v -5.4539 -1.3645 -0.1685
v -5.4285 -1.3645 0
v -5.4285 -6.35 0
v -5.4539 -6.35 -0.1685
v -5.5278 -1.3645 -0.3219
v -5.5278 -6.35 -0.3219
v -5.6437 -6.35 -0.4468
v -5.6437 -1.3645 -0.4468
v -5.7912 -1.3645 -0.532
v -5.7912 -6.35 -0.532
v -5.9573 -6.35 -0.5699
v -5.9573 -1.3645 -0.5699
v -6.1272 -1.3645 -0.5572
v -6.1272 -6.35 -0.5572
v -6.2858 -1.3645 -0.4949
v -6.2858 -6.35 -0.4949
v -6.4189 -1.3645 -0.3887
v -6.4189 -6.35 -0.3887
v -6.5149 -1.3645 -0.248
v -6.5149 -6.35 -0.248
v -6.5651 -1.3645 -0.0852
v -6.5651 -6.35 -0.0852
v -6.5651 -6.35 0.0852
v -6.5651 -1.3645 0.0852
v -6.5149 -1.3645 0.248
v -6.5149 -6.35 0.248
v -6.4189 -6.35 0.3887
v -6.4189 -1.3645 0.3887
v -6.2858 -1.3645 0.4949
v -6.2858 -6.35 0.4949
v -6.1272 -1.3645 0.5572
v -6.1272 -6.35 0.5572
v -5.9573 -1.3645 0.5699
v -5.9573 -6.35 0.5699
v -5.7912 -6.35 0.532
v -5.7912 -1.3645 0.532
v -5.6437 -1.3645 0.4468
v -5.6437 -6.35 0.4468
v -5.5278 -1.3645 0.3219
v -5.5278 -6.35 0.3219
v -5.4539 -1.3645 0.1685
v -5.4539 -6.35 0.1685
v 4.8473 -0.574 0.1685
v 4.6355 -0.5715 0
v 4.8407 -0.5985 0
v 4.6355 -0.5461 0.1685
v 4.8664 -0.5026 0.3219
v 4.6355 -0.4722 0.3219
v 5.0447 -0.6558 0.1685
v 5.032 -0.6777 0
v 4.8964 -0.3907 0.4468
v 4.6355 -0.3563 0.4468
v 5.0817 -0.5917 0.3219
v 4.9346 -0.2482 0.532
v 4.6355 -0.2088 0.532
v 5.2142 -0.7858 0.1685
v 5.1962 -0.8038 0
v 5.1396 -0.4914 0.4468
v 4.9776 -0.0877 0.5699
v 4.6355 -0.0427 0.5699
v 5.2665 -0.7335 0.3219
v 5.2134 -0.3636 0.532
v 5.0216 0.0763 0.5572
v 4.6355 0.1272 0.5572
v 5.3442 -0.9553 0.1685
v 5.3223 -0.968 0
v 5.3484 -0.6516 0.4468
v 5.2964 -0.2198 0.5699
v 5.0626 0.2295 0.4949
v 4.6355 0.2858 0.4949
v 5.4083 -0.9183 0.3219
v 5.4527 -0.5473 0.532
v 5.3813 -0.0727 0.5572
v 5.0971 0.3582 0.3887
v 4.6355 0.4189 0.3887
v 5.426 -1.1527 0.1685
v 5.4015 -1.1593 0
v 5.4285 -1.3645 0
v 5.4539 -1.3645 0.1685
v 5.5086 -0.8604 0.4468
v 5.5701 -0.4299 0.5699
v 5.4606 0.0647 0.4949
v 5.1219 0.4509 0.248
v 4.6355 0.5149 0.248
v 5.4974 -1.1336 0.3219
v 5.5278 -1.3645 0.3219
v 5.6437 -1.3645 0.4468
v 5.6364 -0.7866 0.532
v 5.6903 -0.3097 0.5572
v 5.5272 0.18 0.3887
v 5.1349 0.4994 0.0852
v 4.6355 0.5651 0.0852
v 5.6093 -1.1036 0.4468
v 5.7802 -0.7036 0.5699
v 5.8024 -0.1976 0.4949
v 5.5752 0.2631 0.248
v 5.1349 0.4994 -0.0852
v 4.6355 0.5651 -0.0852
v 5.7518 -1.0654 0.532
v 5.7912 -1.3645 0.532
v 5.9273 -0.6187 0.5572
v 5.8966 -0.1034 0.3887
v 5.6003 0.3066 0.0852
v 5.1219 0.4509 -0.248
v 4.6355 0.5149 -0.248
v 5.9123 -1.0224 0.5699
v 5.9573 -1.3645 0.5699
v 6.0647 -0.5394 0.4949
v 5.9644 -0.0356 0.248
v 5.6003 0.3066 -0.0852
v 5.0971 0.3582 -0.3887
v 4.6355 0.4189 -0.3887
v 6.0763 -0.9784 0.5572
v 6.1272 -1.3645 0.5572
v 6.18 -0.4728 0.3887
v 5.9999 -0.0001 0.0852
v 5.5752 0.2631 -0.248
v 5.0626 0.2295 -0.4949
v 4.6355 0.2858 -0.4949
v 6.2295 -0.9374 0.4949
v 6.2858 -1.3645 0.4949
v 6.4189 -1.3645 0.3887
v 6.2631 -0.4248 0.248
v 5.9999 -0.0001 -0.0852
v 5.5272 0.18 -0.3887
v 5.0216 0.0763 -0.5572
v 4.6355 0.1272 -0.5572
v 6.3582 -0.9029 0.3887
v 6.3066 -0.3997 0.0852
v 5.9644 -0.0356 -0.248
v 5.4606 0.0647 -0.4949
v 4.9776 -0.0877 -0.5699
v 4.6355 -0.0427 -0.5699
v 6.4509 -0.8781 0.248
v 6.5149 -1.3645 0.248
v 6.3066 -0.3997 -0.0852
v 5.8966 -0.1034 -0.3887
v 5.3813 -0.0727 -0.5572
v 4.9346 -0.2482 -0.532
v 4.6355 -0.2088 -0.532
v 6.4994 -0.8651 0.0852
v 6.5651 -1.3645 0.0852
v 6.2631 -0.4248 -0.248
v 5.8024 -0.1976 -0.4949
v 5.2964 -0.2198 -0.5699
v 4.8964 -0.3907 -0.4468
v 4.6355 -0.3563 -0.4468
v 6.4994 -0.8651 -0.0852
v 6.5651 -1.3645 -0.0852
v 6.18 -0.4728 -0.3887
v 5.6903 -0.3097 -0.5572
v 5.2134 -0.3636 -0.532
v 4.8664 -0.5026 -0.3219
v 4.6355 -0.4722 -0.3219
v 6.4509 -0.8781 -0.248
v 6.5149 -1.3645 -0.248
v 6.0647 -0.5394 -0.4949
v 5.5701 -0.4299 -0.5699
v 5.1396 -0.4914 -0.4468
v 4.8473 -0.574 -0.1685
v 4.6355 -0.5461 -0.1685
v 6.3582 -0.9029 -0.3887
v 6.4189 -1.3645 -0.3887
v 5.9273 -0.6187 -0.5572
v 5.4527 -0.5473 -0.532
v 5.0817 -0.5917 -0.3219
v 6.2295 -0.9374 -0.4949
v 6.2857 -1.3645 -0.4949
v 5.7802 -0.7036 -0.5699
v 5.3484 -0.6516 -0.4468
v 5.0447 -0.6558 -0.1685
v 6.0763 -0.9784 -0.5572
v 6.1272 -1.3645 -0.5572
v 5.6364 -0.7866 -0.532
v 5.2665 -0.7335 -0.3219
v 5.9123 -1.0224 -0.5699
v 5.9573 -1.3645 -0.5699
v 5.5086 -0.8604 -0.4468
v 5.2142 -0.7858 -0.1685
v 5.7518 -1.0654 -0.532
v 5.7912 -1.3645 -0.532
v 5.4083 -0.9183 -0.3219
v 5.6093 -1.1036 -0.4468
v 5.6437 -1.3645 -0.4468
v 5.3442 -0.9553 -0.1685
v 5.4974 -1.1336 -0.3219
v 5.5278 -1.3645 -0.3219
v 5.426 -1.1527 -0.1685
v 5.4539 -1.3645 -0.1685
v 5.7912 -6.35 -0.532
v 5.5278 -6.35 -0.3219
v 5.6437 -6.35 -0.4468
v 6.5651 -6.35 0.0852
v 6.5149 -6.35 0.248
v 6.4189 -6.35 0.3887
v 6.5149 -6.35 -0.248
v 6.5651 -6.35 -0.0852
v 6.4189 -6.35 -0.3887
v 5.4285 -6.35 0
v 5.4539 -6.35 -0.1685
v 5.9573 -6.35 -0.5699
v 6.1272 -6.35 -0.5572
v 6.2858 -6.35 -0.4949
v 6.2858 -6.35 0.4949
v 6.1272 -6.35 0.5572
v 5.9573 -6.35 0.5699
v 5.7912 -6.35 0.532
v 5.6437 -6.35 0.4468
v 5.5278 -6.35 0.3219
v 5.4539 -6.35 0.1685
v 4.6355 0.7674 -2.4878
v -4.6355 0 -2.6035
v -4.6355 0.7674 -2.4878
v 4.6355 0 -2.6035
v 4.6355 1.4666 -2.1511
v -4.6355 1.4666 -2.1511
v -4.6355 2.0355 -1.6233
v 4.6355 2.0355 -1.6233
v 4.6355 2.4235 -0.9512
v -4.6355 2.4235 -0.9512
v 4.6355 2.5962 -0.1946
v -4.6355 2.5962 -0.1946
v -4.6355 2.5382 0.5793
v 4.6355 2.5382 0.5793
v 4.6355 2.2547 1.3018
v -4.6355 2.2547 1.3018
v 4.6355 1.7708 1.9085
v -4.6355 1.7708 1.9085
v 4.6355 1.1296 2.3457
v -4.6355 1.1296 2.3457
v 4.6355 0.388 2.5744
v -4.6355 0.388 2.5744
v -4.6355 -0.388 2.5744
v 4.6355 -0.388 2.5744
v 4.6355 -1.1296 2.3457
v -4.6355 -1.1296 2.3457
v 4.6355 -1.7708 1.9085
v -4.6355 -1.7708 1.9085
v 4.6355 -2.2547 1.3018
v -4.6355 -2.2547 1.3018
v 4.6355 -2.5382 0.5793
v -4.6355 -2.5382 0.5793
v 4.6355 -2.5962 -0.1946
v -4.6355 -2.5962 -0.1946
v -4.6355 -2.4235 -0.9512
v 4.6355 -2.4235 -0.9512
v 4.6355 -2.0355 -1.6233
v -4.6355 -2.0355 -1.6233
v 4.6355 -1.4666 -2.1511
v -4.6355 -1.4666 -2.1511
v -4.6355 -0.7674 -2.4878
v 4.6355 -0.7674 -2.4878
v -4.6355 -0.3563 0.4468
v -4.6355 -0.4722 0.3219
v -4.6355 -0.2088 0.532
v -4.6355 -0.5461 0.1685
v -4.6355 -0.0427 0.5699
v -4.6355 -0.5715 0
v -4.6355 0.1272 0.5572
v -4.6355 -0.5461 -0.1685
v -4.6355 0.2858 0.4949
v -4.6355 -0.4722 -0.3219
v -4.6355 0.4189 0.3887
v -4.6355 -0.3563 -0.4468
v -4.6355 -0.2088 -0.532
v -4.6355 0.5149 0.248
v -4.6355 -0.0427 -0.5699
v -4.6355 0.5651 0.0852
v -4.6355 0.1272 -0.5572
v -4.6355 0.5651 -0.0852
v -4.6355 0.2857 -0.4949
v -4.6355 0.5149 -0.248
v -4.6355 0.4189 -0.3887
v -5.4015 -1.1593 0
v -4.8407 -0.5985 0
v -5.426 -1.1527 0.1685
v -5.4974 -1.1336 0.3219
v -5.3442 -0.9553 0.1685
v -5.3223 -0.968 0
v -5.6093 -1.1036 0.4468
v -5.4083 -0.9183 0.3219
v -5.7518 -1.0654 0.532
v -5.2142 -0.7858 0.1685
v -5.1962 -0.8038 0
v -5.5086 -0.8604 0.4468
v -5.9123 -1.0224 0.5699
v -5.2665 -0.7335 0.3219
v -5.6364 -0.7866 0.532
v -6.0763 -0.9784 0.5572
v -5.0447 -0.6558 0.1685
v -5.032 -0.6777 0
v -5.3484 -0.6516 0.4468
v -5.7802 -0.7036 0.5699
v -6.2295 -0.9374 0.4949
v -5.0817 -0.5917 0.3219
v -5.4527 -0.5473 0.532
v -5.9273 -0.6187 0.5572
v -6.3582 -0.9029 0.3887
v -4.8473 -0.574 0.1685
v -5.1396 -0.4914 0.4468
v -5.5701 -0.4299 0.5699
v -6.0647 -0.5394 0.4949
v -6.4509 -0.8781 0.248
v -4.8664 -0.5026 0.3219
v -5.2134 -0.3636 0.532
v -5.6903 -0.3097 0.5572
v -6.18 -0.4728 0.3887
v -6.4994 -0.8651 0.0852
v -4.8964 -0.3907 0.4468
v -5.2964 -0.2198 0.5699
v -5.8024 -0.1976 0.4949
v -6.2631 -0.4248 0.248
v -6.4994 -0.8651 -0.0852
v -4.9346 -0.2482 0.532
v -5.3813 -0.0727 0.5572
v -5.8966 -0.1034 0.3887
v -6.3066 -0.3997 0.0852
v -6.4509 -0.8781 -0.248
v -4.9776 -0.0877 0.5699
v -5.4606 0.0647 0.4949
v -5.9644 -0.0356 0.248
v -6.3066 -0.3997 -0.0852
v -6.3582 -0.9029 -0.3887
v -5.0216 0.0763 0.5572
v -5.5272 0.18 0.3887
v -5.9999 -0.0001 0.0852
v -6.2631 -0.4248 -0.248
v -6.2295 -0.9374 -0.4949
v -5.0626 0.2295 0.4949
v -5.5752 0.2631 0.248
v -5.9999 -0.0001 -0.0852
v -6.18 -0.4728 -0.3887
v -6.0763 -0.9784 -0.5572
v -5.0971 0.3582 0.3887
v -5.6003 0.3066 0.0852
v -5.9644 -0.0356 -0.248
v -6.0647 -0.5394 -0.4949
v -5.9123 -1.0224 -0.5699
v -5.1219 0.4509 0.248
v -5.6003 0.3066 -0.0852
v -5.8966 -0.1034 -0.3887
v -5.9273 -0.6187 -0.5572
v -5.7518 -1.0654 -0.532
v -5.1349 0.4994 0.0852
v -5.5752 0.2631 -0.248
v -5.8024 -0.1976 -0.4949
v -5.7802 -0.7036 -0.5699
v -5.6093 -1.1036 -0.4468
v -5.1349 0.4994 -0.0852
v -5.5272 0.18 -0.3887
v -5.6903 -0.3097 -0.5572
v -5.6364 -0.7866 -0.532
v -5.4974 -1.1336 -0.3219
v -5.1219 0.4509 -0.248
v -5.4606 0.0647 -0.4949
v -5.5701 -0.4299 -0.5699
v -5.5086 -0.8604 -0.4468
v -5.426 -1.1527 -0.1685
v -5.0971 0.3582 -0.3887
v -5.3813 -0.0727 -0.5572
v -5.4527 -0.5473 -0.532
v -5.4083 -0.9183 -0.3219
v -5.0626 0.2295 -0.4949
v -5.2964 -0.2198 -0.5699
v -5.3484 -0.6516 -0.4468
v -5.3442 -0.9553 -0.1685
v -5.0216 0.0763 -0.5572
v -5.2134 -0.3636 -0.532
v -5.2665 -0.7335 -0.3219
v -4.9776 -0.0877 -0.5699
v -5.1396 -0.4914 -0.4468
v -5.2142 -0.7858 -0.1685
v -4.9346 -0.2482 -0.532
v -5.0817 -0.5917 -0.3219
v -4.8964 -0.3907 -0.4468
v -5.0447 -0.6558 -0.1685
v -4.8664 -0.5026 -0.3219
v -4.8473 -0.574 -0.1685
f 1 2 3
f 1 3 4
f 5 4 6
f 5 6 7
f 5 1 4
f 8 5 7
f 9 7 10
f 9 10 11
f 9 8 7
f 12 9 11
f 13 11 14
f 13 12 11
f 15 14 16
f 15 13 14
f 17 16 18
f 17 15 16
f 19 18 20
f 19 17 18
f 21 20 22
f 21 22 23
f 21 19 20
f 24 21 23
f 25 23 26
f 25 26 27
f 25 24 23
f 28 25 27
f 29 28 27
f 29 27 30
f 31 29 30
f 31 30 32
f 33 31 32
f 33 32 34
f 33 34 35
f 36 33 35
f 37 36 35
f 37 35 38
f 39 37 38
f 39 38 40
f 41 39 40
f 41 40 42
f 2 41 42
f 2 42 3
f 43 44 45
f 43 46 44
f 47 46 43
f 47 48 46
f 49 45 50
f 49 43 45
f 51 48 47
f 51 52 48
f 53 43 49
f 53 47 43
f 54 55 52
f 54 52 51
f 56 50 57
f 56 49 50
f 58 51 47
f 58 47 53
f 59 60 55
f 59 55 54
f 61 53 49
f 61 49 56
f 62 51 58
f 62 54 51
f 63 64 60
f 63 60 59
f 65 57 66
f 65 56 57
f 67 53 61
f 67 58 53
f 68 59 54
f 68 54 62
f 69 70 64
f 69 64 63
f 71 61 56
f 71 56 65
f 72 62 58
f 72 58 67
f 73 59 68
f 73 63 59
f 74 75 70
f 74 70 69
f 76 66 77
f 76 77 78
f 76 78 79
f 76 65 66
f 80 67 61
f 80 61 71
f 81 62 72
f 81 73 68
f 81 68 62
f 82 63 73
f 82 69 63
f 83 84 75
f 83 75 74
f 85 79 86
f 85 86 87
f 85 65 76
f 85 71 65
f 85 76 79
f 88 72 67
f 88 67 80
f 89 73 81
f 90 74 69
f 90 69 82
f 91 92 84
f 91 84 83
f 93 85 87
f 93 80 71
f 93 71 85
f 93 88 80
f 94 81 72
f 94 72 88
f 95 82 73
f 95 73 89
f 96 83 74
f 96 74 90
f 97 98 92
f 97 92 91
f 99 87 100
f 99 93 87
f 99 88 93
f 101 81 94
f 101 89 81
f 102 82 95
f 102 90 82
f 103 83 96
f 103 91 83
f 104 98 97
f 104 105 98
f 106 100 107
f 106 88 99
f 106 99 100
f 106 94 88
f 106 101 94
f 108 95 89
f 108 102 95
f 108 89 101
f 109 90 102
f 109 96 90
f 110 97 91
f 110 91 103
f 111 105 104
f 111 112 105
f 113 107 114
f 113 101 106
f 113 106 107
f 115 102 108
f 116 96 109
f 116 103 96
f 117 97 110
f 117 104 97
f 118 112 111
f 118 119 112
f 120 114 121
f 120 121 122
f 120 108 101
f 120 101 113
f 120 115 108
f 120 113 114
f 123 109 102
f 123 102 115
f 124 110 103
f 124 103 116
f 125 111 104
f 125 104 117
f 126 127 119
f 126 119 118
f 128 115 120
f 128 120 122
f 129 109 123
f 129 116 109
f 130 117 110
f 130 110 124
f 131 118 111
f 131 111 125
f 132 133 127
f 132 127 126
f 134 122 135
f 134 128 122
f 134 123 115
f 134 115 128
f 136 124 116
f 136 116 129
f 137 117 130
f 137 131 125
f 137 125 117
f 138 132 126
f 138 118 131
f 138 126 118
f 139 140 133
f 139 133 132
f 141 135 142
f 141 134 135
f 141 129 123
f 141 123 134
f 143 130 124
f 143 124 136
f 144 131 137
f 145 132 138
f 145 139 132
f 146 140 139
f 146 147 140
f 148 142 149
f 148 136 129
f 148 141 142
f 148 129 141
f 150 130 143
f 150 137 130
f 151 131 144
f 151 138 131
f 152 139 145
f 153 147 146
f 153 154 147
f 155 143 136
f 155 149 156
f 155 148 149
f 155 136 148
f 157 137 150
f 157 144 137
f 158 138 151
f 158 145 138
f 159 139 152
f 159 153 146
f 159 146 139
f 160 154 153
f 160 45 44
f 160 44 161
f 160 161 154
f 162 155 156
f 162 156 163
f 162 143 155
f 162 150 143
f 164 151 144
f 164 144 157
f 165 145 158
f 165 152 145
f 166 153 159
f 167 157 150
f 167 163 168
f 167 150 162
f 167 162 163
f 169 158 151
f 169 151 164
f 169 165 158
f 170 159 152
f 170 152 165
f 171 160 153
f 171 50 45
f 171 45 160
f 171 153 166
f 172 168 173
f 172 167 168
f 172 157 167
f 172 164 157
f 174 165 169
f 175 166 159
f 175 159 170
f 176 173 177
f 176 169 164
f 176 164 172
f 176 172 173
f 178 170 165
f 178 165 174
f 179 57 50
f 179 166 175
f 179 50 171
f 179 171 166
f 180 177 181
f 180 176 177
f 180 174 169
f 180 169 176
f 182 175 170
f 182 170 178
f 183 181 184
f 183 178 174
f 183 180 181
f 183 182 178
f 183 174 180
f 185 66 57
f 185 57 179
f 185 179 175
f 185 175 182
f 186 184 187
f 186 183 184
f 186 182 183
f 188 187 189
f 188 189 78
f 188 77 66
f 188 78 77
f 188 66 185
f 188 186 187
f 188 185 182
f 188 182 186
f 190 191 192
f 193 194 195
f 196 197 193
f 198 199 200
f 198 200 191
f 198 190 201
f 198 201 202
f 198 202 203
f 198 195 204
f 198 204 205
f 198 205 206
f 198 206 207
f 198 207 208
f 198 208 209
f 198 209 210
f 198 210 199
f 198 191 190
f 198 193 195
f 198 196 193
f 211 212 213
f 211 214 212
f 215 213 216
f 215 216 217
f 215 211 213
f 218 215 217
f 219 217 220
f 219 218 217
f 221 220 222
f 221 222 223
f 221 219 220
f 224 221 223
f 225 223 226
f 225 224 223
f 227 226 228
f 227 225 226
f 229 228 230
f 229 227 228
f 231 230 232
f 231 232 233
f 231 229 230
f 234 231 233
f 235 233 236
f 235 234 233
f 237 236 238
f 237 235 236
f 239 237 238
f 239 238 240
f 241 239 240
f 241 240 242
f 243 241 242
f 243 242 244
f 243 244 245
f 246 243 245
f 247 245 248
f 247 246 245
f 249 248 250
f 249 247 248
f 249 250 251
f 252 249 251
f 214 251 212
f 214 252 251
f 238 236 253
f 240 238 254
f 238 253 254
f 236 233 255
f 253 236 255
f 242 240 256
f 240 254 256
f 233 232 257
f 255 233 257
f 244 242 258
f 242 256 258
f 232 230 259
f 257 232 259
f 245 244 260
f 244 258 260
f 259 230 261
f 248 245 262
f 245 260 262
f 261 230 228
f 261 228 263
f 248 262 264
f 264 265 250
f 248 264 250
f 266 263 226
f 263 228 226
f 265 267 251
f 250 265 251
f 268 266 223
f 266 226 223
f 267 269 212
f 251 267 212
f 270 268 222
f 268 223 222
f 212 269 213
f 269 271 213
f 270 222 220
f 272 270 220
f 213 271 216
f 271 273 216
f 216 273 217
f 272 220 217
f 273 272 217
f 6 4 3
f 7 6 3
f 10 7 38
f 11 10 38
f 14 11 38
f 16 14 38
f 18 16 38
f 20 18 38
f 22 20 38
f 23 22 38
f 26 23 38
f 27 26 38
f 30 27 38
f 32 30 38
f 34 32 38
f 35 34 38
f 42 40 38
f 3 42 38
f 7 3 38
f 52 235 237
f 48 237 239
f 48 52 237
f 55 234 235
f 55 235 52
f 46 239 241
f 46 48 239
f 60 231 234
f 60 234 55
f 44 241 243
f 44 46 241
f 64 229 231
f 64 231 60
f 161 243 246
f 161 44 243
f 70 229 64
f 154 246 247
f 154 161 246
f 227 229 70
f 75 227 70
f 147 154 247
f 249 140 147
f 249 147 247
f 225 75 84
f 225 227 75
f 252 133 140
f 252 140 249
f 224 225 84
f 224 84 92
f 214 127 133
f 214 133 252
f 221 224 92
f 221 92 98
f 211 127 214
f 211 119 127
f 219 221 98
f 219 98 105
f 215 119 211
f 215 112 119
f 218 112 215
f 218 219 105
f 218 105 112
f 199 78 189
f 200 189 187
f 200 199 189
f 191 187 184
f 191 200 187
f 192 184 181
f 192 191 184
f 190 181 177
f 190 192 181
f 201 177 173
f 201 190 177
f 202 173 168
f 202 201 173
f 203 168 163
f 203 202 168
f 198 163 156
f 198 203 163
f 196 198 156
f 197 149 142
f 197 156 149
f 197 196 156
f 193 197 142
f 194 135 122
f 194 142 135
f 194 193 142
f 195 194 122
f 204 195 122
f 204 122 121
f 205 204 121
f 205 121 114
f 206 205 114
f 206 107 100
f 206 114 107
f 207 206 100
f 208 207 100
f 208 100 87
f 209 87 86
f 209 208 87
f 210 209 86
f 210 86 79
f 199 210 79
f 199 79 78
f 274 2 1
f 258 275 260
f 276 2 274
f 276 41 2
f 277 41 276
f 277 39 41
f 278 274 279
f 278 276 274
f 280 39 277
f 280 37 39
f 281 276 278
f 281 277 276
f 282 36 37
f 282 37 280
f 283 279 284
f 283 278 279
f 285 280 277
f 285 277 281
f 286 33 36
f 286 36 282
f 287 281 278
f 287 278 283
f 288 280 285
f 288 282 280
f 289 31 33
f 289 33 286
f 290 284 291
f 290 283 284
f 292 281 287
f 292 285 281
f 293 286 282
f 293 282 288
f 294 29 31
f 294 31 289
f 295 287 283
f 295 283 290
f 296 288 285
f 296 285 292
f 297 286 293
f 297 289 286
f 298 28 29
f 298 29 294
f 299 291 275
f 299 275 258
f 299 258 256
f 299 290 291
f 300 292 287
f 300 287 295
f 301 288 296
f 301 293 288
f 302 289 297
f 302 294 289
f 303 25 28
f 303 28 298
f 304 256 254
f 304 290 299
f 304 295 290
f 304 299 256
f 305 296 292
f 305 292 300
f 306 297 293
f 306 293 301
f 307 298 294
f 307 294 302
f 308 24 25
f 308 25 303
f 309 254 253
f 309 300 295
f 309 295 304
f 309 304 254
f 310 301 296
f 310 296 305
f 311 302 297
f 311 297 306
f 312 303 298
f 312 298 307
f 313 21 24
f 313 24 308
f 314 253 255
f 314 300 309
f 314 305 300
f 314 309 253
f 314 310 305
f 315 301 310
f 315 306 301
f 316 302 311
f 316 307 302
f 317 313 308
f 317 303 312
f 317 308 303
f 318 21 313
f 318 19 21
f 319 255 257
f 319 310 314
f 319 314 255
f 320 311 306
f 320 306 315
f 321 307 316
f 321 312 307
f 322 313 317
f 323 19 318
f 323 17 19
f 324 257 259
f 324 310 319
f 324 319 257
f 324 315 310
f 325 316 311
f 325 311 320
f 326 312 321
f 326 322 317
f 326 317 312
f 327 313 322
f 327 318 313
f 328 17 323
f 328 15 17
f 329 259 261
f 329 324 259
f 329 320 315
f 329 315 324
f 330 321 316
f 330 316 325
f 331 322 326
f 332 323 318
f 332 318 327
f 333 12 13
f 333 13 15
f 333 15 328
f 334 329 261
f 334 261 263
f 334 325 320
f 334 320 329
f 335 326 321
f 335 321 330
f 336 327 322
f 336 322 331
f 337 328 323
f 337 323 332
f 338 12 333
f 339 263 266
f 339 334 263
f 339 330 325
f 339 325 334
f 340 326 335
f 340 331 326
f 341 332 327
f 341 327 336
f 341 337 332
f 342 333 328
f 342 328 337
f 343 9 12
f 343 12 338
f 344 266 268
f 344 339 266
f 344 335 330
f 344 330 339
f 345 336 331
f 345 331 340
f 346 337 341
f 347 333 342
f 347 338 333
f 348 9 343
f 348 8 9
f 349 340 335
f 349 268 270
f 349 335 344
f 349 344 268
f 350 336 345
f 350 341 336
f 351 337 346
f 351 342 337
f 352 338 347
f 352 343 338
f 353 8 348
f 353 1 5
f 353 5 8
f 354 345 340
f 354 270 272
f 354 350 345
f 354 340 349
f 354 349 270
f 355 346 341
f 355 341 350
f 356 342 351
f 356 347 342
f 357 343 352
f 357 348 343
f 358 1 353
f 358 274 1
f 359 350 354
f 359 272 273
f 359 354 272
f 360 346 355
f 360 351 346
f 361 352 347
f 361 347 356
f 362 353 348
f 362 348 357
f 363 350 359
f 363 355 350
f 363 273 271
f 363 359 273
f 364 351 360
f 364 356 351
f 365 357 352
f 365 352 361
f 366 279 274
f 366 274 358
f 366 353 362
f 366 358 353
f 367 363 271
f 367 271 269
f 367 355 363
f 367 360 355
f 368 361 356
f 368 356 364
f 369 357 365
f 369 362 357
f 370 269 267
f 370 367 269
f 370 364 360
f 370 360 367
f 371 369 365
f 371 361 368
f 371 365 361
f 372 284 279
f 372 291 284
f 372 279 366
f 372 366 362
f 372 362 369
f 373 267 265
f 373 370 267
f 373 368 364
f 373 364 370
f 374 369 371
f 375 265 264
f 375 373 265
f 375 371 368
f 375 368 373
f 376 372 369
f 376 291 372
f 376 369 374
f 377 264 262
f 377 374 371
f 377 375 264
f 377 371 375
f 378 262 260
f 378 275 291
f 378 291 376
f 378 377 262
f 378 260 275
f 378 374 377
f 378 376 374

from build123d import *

# Parameters (mm, degrees)
SKETCH1_R           = 2.6035
BOSS_EXTRUDE1_DEPTH = 4.6355
SKETCH3_R           = 0.5715


with BuildPart() as part:
    # Sketch1 → Boss-Extrude1 (new, symmetric)
    with BuildSketch(Plane(origin=(0, 0, 0), x_dir=(0, 0, -1), z_dir=(1, 0, 0))):
        Circle(SKETCH1_R)
    extrude(amount=BOSS_EXTRUDE1_DEPTH, both=True)

    # Sweep1: sweep along a path in Sketch2
    with BuildLine(Plane.XY) as sweep1_path:
        Line((-6, -6.35), (-6, -1.3645))
        ThreePointArc((-6, -1.3645), (-5.600347203, -0.399652797), (-4.6355, 0))
        Line((-4.6355, 0), (4.6355, 0))
        ThreePointArc((4.6355, 0), (5.600347203, -0.399652797), (6, -1.3645))
        Line((6, -1.3645), (6, -6.35))
    # Sketch3 → Sweep1 (sweep)
    with BuildSketch(Plane(origin=(-6, -6.35, 0), x_dir=(1, 0, 0), z_dir=(0, 1, 0))):
        Circle(SKETCH3_R)
    sweep(path=sweep1_path.line)


solid = part.part
